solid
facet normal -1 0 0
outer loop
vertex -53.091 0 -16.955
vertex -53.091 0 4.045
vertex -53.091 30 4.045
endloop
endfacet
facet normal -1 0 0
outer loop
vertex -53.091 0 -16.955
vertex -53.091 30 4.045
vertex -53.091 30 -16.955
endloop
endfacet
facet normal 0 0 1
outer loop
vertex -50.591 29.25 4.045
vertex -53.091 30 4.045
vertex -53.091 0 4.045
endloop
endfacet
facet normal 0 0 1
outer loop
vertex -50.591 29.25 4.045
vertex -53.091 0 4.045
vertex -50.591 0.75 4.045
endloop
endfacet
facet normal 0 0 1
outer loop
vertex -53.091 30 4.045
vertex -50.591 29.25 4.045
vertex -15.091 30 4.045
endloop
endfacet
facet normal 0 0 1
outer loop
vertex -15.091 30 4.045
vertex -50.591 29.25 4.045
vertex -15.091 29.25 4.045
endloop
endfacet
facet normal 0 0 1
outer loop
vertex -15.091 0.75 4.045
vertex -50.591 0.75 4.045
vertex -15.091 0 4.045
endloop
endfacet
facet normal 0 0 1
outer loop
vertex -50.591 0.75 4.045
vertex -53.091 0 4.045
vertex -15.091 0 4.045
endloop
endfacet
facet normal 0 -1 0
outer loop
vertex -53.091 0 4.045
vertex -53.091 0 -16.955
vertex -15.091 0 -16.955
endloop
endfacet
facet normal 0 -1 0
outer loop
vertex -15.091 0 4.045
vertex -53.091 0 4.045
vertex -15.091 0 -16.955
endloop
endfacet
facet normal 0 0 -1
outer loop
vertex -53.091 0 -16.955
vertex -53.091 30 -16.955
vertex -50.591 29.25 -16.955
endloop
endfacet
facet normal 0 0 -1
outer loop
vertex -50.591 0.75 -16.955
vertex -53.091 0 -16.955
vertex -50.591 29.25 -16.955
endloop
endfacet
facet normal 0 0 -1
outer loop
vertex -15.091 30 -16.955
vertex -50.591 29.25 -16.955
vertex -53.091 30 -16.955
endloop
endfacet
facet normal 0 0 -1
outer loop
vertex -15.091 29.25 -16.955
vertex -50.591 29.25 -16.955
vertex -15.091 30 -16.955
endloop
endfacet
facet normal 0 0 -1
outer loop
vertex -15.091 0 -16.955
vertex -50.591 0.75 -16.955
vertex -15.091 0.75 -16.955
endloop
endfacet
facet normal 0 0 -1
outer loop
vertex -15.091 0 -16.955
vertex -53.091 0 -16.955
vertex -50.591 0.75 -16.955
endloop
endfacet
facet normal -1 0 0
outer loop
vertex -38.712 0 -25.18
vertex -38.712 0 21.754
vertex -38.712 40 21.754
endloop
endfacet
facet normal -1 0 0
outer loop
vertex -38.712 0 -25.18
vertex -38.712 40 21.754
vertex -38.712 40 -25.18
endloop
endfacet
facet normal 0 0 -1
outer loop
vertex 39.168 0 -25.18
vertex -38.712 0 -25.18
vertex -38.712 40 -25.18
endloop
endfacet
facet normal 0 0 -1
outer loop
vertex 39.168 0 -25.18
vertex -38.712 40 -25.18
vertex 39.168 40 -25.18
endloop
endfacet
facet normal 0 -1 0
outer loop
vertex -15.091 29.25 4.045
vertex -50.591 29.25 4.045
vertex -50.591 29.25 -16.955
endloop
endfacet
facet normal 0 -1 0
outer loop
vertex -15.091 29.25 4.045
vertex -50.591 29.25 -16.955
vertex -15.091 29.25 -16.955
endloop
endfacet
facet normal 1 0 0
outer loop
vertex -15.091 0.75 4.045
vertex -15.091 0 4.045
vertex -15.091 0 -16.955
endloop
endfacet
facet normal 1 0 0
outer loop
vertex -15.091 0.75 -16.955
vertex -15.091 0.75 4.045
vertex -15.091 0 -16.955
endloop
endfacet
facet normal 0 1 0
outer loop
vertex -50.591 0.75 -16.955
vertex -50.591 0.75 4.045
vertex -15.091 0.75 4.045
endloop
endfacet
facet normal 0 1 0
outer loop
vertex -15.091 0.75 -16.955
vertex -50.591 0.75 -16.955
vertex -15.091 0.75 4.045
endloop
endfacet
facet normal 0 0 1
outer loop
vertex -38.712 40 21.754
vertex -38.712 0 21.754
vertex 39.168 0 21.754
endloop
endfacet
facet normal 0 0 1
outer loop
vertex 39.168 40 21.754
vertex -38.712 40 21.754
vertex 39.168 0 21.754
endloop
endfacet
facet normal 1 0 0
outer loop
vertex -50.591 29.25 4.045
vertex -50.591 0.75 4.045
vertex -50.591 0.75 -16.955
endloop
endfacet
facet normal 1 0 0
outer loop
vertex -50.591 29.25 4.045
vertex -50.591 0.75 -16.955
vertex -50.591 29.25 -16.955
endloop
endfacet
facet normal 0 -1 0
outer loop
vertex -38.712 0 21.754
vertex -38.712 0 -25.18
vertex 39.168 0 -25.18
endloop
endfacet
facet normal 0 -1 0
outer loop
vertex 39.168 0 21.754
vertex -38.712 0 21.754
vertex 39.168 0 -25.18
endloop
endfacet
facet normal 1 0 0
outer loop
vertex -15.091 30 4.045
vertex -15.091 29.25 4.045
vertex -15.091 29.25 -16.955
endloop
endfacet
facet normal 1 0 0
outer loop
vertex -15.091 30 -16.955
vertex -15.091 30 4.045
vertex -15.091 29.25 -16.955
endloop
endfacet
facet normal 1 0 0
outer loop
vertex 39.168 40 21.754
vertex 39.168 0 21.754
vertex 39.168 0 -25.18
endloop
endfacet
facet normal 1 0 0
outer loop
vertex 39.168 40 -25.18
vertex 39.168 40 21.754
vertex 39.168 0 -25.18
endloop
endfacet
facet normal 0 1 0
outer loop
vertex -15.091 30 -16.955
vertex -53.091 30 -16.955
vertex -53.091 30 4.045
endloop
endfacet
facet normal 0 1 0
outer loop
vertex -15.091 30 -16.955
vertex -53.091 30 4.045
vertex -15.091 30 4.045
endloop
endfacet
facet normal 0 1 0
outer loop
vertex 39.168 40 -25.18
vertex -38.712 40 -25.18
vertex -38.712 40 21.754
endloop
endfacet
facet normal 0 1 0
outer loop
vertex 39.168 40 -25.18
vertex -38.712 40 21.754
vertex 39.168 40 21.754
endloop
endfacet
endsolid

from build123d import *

# Parameters (mm, degrees)
SKETCH1_W           = 77.879871538
SKETCH1_H           = 46.933470971
BOSS_EXTRUDE1_DEPTH = 40
SKETCH7_W           = 38
SKETCH7_H           = 21
BOSS_EXTRUDE3_DEPTH = 30
SKETCH8_W           = 40
SKETCH8_H           = 28.5
CUT_EXTRUDE1_DEPTH  = 50


with BuildPart() as part:
    # Sketch1 → Boss-Extrude1 (new body)
    with BuildSketch(Plane(origin=(0, 0, 0), x_dir=(1, 0, 0), z_dir=(0, 1, 0))):
        with Locations((0.22838672, 1.7129004)):
            Rectangle(SKETCH1_W, SKETCH1_H)
    extrude(amount=BOSS_EXTRUDE1_DEPTH)


with BuildPart() as body_2:
    # Sketch7 → Boss-Extrude3 (new body)
    with BuildSketch(Plane(origin=(0, 0, 0), x_dir=(1, 0, 0), z_dir=(0, 1, 0))):
        with Locations((-34.090526118, 6.455021393)):
            Rectangle(SKETCH7_W, SKETCH7_H)
    extrude(amount=BOSS_EXTRUDE3_DEPTH)

    # Sketch8 → Cut-Extrude1 (cut)
    with BuildSketch(Plane.XY.offset(4.044978607)):
        with Locations((-30.590526118, 15)):
            Rectangle(SKETCH8_W, SKETCH8_H)
    extrude(amount=-CUT_EXTRUDE1_DEPTH, mode=Mode.SUBTRACT)


solid = Compound([part.part, body_2.part])
